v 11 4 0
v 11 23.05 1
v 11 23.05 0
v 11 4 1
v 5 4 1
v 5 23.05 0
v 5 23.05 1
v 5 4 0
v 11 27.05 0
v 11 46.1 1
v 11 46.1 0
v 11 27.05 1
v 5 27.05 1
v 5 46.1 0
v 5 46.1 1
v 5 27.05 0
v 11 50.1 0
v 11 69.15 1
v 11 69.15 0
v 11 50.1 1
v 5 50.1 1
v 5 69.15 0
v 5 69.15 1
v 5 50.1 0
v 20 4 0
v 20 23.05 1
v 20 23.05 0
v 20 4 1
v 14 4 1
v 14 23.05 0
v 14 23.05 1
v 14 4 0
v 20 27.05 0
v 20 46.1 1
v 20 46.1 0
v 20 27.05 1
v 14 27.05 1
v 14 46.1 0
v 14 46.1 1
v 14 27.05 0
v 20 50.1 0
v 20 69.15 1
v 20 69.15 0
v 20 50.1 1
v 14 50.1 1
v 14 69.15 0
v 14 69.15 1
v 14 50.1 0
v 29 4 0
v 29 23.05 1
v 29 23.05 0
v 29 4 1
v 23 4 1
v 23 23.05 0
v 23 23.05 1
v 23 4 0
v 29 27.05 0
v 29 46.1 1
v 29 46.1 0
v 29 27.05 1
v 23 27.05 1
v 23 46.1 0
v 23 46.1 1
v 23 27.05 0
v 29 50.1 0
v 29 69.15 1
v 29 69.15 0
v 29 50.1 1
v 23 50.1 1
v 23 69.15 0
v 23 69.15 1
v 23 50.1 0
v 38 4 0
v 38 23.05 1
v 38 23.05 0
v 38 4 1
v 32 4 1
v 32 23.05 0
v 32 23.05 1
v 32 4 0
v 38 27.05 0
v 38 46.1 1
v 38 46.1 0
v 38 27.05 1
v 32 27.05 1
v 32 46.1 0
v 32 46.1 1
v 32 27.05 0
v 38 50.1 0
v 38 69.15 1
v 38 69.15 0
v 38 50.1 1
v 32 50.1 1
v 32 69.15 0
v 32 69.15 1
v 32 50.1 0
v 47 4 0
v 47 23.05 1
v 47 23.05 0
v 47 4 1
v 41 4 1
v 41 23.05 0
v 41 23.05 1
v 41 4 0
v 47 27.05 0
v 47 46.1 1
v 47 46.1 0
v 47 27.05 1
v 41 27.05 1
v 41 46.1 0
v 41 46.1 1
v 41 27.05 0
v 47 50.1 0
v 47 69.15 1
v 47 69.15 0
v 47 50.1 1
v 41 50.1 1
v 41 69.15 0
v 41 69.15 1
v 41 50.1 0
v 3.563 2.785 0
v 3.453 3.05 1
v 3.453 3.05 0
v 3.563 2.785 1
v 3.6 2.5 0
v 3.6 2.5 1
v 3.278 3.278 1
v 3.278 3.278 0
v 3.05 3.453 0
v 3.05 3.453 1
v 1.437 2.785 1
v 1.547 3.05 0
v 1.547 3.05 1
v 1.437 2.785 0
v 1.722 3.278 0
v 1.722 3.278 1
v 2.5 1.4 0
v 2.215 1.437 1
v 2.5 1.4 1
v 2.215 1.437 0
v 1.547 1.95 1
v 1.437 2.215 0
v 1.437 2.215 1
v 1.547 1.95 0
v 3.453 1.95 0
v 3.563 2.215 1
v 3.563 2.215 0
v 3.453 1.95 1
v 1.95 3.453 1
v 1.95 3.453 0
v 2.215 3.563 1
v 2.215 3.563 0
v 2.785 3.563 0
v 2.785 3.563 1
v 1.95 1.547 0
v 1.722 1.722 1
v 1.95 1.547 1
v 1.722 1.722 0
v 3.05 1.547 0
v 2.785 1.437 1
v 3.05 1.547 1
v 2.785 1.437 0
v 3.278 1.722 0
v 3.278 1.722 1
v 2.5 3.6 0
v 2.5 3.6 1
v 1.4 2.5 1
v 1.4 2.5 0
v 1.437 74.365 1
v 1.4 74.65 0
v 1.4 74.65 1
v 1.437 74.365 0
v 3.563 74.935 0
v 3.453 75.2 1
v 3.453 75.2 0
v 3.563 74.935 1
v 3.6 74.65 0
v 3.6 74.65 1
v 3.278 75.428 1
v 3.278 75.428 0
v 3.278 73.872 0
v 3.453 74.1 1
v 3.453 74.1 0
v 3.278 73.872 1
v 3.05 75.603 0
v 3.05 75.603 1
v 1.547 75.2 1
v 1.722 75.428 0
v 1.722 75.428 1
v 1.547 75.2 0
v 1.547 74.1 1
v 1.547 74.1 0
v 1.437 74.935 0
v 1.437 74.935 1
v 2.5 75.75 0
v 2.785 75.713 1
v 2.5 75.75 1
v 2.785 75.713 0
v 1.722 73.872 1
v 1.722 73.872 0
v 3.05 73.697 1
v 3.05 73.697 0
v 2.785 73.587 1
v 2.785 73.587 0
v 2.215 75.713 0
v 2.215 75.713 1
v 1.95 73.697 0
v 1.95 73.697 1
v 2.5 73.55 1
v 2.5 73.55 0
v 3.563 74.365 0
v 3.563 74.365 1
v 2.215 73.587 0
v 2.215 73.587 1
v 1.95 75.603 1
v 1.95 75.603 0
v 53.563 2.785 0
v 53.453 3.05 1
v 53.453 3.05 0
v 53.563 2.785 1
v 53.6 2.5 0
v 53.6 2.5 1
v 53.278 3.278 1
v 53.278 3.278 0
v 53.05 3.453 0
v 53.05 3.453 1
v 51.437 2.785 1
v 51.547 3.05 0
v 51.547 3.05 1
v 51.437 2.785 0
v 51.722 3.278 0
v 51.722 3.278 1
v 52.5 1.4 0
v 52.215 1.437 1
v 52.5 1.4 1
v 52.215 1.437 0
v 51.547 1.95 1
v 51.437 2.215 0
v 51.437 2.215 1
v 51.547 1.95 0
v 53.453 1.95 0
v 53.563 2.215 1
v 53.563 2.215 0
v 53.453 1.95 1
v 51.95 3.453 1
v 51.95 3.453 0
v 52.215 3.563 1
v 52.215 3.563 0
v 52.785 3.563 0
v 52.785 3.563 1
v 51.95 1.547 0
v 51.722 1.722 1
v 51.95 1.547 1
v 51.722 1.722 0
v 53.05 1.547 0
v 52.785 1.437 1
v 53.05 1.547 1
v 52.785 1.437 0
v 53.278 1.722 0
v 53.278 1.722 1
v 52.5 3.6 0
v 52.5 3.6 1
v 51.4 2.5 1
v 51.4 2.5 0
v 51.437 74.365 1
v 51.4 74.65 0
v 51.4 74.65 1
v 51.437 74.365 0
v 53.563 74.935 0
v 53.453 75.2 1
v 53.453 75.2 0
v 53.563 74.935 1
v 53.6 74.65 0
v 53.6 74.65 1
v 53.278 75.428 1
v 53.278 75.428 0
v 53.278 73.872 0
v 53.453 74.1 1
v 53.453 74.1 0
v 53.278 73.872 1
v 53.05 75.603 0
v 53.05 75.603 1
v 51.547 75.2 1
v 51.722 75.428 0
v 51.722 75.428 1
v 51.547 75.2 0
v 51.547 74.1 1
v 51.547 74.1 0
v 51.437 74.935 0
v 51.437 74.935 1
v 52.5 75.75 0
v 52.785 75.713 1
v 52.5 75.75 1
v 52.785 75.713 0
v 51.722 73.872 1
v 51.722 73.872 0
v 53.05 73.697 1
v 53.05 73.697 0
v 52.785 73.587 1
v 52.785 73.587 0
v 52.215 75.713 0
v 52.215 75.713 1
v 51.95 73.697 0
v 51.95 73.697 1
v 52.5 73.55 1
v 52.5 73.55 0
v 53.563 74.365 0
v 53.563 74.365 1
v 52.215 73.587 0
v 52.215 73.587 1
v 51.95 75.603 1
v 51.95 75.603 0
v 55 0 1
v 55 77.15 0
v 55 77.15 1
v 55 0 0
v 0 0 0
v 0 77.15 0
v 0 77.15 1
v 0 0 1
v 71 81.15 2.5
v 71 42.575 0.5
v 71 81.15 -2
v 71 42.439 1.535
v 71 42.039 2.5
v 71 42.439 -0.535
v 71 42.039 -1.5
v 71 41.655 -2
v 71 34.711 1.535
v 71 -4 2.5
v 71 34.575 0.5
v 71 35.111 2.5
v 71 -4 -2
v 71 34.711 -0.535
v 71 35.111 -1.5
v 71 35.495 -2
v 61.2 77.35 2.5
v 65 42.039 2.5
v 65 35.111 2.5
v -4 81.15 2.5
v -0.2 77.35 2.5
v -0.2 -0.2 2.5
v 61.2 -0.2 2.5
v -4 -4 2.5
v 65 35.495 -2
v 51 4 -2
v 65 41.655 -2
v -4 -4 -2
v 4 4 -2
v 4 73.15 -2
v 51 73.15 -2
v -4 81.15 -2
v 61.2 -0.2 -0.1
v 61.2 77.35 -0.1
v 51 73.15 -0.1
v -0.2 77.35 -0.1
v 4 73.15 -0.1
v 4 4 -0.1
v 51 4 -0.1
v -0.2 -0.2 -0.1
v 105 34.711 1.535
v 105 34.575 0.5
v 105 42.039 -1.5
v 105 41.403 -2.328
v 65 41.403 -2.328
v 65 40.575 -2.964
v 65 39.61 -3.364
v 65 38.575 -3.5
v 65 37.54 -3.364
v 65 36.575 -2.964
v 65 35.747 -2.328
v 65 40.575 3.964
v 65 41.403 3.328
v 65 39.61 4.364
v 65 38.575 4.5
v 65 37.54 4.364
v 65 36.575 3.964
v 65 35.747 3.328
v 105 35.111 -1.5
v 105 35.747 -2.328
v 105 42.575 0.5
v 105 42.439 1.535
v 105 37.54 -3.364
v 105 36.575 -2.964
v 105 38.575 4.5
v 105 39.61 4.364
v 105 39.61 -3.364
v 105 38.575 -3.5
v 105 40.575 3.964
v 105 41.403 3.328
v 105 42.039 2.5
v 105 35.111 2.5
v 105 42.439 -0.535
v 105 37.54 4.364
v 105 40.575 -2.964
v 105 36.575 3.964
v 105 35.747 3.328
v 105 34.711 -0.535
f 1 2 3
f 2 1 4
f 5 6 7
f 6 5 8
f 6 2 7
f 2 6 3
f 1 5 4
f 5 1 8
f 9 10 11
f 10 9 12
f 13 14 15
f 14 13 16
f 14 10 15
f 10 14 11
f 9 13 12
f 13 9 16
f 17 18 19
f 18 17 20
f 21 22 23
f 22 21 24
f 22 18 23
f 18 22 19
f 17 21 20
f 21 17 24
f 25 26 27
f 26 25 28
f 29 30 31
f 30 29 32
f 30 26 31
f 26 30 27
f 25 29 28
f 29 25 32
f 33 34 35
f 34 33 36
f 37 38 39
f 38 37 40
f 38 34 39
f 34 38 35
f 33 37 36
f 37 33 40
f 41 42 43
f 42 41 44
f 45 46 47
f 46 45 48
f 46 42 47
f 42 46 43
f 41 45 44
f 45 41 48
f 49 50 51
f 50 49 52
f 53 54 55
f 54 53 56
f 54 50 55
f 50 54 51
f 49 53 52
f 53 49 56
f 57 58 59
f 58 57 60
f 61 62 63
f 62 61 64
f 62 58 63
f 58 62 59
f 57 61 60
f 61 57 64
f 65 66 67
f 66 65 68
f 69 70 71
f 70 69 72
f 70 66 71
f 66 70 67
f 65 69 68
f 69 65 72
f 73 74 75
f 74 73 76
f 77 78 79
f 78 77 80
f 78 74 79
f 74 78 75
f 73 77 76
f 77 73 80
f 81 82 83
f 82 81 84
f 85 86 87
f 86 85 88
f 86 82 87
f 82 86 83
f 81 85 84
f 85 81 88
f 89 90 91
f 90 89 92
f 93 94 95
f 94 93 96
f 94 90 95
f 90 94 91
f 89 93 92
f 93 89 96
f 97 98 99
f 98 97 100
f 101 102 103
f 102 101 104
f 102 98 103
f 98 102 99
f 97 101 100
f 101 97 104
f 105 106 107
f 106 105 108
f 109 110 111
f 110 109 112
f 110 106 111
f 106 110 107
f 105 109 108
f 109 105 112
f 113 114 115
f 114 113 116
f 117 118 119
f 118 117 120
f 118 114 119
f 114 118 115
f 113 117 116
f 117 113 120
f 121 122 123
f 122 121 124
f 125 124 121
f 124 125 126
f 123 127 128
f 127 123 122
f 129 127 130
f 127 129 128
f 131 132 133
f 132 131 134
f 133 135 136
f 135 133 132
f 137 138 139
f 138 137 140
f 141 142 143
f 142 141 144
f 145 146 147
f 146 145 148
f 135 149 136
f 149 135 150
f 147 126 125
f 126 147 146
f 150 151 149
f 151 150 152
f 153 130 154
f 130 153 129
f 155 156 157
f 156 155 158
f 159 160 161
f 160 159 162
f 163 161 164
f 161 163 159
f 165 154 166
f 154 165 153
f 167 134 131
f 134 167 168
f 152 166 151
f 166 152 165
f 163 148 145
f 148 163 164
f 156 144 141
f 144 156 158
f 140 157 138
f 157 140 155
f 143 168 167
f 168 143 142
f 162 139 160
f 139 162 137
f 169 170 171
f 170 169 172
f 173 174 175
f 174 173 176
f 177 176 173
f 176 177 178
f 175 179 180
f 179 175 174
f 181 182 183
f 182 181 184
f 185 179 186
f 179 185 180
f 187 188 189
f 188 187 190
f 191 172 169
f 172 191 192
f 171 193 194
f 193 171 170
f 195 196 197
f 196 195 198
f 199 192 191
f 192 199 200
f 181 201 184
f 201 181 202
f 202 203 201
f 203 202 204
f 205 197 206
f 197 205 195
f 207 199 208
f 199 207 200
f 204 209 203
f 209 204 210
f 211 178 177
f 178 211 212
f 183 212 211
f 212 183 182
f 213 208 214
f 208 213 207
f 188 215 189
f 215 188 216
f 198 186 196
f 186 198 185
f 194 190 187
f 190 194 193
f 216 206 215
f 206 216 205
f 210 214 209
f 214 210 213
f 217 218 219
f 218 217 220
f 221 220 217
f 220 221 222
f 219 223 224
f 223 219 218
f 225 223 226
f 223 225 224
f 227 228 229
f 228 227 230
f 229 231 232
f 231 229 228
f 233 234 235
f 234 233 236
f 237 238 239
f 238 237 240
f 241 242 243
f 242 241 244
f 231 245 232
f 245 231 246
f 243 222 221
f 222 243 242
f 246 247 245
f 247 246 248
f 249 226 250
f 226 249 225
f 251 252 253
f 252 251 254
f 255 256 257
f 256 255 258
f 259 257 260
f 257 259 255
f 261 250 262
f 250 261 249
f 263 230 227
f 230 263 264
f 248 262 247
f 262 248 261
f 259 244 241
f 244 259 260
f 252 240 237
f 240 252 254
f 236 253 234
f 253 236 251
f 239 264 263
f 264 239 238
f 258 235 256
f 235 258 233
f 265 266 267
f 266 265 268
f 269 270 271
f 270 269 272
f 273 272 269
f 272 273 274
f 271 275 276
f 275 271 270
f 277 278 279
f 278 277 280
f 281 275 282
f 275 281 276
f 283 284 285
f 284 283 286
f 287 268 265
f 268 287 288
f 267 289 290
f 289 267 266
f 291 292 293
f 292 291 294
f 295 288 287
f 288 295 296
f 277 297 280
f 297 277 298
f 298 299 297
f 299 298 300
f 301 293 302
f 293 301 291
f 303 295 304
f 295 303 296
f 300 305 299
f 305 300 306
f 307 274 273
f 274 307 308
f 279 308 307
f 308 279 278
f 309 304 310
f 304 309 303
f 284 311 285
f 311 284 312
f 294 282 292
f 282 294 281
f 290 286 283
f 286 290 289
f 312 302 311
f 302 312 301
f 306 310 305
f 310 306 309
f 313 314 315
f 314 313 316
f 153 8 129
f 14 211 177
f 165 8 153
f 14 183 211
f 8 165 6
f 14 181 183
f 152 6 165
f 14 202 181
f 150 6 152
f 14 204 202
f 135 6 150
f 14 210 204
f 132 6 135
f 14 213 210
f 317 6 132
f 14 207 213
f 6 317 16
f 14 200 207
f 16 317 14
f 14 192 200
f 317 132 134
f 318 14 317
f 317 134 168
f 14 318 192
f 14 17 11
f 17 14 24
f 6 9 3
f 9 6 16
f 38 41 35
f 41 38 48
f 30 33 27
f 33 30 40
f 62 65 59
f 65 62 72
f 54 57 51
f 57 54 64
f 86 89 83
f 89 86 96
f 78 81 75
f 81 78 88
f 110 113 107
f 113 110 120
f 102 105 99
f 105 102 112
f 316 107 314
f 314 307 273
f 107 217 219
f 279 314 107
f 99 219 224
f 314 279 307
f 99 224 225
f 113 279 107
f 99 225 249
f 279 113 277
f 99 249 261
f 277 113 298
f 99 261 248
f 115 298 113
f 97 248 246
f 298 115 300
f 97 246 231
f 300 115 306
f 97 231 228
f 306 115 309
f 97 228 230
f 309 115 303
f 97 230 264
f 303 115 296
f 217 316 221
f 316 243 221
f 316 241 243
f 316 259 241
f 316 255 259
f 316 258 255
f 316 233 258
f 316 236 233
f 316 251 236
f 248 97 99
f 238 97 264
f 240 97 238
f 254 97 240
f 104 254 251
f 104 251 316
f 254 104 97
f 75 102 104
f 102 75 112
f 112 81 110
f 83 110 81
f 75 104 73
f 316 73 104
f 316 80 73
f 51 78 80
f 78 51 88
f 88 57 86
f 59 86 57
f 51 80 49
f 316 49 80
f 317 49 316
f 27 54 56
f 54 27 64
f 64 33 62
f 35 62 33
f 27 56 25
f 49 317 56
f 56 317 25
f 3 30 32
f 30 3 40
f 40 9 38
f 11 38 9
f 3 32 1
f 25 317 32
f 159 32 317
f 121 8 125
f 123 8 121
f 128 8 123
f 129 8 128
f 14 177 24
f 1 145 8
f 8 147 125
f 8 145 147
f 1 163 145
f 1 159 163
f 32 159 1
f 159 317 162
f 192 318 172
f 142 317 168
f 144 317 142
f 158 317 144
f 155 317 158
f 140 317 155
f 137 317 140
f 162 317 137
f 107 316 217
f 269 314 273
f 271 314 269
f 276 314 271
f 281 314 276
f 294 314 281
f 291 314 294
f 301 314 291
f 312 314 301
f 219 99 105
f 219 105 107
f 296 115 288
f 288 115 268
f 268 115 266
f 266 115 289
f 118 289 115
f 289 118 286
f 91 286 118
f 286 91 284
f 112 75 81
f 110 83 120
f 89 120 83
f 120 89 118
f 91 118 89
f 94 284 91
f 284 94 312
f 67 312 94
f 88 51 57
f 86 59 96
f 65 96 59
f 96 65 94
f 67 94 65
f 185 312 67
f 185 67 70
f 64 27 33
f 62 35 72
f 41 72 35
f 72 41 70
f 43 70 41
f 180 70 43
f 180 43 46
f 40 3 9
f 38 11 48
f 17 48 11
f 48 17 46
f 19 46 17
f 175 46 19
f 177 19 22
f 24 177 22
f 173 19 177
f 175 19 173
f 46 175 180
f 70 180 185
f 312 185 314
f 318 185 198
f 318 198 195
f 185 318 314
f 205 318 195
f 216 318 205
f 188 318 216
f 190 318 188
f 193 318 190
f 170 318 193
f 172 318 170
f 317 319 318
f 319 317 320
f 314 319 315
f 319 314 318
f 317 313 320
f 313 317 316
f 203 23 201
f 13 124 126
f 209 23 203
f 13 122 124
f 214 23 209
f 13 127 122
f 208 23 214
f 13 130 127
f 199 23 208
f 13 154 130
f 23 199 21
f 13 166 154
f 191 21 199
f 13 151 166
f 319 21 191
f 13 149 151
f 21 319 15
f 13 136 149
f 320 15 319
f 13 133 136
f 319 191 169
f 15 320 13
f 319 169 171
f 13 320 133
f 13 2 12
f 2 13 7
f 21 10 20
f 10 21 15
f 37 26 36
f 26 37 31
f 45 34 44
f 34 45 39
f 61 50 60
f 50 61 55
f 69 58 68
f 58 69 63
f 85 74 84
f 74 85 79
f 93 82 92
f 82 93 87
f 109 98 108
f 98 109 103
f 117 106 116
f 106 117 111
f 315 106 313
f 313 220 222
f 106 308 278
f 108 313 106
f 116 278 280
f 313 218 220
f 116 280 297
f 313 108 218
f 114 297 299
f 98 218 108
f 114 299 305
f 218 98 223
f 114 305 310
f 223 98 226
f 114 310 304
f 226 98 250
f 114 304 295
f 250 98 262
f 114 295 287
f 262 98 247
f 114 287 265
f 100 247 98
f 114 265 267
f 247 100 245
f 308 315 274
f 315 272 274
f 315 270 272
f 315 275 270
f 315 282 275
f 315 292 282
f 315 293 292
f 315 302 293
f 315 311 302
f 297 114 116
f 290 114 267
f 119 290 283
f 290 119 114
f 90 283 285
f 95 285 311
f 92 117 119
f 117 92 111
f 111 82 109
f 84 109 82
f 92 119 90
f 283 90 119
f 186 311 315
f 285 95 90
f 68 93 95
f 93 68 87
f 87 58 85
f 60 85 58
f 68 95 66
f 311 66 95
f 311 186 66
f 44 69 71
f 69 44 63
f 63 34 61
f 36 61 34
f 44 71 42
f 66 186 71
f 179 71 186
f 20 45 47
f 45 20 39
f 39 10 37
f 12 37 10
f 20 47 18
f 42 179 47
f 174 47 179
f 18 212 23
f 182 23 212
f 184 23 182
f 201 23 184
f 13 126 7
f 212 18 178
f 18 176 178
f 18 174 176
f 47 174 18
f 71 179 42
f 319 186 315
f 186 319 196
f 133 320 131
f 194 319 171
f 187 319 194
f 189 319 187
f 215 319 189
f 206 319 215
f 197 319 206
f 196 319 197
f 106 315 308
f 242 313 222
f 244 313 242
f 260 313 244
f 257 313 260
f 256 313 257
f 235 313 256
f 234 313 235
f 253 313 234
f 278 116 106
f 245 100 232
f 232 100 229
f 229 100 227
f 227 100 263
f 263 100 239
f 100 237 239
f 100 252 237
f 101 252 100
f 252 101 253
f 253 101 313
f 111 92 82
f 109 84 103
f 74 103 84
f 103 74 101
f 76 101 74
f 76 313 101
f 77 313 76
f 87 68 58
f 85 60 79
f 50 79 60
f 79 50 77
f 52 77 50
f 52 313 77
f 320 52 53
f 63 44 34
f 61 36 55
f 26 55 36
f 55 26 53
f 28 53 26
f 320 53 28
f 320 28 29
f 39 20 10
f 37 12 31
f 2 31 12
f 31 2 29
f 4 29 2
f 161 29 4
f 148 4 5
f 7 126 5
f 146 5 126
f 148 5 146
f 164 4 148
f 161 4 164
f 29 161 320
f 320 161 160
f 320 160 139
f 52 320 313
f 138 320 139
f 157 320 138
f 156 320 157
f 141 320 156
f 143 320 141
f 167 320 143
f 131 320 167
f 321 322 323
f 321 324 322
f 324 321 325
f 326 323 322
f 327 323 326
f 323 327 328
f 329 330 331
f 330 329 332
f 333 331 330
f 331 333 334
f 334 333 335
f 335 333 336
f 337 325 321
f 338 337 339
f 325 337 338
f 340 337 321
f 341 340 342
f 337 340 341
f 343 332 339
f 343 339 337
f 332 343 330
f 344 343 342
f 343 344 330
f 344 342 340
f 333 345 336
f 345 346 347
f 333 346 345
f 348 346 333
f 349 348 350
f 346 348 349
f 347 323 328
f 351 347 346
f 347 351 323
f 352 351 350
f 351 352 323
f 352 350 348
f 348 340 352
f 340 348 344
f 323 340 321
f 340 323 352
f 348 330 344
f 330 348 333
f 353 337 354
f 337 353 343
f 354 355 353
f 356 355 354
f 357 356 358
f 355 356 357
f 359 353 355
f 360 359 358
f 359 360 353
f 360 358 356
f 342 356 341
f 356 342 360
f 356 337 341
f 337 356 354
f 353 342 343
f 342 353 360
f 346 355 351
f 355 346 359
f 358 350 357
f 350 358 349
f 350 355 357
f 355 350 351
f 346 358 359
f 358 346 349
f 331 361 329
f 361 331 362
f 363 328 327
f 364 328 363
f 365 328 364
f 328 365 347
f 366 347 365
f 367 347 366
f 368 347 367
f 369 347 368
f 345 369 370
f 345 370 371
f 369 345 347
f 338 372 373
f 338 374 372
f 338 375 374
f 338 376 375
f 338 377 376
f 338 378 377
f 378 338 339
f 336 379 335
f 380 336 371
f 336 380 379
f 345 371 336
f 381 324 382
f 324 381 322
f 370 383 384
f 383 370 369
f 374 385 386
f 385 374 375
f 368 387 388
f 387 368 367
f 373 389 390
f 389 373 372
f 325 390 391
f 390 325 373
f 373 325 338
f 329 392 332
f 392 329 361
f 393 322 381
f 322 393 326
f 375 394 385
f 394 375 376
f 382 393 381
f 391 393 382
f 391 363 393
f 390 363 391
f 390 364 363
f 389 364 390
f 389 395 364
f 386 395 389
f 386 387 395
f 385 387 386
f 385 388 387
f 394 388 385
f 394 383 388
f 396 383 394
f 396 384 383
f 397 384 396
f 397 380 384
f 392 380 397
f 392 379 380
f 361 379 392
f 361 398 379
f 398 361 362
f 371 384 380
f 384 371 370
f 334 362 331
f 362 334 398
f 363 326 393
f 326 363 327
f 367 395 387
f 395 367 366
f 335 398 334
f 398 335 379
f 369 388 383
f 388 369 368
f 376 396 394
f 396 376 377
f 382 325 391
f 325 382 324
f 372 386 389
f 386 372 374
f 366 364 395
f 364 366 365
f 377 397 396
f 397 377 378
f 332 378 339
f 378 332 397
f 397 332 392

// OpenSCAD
// baebugs variable-aperture slot pair (proof of concept; laser-cut 316L, deburr all edges)
// w0=6.0 mm, slot length=19.05 mm, pitch=9.0 mm, sheet=0.5 mm
offset = 0;   // 0 = fully open (6.0 mm); width = 6.0 - offset
module slot_plate(t) {
  difference() {
    cube([55.0, 77.15, t]);
    for (i = [0:4], j = [0:2])
      translate([5 + i*9.0, 4 + j*23.05, -1]) cube([6.0, 19.05, t + 2]);
    for (x = [2.5, 52.5], y = [2.5, 74.65]) translate([x, y, -1]) cylinder(d=2.2, h=t+2, $fn=24);
  }
}
slot_plate(0.5);                                        // fixed plate
color("silver") translate([offset, 0, 0.5]) slot_plate(0.5);   // sliding plate
// printed guide frame: rails either side of the sliding plate, lead-screw boss on +x
color("white") difference() {
  translate([-4, -4, -2]) cube([75.0, 85.15, 2 + 2*0.5 + 1.5]);
  translate([-0.2, -0.2, -0.1]) cube([55.0 + 0.4 + 6.0, 77.15 + 0.4, 10]);
  translate([4, 4, -3]) cube([47.0, 69.15, 5]);
}
translate([65.0, 38.575, 0.5]) rotate([0, 90, 0]) color("gray") cylinder(d=8, h=40, $fn=24); // M8 lead screw
